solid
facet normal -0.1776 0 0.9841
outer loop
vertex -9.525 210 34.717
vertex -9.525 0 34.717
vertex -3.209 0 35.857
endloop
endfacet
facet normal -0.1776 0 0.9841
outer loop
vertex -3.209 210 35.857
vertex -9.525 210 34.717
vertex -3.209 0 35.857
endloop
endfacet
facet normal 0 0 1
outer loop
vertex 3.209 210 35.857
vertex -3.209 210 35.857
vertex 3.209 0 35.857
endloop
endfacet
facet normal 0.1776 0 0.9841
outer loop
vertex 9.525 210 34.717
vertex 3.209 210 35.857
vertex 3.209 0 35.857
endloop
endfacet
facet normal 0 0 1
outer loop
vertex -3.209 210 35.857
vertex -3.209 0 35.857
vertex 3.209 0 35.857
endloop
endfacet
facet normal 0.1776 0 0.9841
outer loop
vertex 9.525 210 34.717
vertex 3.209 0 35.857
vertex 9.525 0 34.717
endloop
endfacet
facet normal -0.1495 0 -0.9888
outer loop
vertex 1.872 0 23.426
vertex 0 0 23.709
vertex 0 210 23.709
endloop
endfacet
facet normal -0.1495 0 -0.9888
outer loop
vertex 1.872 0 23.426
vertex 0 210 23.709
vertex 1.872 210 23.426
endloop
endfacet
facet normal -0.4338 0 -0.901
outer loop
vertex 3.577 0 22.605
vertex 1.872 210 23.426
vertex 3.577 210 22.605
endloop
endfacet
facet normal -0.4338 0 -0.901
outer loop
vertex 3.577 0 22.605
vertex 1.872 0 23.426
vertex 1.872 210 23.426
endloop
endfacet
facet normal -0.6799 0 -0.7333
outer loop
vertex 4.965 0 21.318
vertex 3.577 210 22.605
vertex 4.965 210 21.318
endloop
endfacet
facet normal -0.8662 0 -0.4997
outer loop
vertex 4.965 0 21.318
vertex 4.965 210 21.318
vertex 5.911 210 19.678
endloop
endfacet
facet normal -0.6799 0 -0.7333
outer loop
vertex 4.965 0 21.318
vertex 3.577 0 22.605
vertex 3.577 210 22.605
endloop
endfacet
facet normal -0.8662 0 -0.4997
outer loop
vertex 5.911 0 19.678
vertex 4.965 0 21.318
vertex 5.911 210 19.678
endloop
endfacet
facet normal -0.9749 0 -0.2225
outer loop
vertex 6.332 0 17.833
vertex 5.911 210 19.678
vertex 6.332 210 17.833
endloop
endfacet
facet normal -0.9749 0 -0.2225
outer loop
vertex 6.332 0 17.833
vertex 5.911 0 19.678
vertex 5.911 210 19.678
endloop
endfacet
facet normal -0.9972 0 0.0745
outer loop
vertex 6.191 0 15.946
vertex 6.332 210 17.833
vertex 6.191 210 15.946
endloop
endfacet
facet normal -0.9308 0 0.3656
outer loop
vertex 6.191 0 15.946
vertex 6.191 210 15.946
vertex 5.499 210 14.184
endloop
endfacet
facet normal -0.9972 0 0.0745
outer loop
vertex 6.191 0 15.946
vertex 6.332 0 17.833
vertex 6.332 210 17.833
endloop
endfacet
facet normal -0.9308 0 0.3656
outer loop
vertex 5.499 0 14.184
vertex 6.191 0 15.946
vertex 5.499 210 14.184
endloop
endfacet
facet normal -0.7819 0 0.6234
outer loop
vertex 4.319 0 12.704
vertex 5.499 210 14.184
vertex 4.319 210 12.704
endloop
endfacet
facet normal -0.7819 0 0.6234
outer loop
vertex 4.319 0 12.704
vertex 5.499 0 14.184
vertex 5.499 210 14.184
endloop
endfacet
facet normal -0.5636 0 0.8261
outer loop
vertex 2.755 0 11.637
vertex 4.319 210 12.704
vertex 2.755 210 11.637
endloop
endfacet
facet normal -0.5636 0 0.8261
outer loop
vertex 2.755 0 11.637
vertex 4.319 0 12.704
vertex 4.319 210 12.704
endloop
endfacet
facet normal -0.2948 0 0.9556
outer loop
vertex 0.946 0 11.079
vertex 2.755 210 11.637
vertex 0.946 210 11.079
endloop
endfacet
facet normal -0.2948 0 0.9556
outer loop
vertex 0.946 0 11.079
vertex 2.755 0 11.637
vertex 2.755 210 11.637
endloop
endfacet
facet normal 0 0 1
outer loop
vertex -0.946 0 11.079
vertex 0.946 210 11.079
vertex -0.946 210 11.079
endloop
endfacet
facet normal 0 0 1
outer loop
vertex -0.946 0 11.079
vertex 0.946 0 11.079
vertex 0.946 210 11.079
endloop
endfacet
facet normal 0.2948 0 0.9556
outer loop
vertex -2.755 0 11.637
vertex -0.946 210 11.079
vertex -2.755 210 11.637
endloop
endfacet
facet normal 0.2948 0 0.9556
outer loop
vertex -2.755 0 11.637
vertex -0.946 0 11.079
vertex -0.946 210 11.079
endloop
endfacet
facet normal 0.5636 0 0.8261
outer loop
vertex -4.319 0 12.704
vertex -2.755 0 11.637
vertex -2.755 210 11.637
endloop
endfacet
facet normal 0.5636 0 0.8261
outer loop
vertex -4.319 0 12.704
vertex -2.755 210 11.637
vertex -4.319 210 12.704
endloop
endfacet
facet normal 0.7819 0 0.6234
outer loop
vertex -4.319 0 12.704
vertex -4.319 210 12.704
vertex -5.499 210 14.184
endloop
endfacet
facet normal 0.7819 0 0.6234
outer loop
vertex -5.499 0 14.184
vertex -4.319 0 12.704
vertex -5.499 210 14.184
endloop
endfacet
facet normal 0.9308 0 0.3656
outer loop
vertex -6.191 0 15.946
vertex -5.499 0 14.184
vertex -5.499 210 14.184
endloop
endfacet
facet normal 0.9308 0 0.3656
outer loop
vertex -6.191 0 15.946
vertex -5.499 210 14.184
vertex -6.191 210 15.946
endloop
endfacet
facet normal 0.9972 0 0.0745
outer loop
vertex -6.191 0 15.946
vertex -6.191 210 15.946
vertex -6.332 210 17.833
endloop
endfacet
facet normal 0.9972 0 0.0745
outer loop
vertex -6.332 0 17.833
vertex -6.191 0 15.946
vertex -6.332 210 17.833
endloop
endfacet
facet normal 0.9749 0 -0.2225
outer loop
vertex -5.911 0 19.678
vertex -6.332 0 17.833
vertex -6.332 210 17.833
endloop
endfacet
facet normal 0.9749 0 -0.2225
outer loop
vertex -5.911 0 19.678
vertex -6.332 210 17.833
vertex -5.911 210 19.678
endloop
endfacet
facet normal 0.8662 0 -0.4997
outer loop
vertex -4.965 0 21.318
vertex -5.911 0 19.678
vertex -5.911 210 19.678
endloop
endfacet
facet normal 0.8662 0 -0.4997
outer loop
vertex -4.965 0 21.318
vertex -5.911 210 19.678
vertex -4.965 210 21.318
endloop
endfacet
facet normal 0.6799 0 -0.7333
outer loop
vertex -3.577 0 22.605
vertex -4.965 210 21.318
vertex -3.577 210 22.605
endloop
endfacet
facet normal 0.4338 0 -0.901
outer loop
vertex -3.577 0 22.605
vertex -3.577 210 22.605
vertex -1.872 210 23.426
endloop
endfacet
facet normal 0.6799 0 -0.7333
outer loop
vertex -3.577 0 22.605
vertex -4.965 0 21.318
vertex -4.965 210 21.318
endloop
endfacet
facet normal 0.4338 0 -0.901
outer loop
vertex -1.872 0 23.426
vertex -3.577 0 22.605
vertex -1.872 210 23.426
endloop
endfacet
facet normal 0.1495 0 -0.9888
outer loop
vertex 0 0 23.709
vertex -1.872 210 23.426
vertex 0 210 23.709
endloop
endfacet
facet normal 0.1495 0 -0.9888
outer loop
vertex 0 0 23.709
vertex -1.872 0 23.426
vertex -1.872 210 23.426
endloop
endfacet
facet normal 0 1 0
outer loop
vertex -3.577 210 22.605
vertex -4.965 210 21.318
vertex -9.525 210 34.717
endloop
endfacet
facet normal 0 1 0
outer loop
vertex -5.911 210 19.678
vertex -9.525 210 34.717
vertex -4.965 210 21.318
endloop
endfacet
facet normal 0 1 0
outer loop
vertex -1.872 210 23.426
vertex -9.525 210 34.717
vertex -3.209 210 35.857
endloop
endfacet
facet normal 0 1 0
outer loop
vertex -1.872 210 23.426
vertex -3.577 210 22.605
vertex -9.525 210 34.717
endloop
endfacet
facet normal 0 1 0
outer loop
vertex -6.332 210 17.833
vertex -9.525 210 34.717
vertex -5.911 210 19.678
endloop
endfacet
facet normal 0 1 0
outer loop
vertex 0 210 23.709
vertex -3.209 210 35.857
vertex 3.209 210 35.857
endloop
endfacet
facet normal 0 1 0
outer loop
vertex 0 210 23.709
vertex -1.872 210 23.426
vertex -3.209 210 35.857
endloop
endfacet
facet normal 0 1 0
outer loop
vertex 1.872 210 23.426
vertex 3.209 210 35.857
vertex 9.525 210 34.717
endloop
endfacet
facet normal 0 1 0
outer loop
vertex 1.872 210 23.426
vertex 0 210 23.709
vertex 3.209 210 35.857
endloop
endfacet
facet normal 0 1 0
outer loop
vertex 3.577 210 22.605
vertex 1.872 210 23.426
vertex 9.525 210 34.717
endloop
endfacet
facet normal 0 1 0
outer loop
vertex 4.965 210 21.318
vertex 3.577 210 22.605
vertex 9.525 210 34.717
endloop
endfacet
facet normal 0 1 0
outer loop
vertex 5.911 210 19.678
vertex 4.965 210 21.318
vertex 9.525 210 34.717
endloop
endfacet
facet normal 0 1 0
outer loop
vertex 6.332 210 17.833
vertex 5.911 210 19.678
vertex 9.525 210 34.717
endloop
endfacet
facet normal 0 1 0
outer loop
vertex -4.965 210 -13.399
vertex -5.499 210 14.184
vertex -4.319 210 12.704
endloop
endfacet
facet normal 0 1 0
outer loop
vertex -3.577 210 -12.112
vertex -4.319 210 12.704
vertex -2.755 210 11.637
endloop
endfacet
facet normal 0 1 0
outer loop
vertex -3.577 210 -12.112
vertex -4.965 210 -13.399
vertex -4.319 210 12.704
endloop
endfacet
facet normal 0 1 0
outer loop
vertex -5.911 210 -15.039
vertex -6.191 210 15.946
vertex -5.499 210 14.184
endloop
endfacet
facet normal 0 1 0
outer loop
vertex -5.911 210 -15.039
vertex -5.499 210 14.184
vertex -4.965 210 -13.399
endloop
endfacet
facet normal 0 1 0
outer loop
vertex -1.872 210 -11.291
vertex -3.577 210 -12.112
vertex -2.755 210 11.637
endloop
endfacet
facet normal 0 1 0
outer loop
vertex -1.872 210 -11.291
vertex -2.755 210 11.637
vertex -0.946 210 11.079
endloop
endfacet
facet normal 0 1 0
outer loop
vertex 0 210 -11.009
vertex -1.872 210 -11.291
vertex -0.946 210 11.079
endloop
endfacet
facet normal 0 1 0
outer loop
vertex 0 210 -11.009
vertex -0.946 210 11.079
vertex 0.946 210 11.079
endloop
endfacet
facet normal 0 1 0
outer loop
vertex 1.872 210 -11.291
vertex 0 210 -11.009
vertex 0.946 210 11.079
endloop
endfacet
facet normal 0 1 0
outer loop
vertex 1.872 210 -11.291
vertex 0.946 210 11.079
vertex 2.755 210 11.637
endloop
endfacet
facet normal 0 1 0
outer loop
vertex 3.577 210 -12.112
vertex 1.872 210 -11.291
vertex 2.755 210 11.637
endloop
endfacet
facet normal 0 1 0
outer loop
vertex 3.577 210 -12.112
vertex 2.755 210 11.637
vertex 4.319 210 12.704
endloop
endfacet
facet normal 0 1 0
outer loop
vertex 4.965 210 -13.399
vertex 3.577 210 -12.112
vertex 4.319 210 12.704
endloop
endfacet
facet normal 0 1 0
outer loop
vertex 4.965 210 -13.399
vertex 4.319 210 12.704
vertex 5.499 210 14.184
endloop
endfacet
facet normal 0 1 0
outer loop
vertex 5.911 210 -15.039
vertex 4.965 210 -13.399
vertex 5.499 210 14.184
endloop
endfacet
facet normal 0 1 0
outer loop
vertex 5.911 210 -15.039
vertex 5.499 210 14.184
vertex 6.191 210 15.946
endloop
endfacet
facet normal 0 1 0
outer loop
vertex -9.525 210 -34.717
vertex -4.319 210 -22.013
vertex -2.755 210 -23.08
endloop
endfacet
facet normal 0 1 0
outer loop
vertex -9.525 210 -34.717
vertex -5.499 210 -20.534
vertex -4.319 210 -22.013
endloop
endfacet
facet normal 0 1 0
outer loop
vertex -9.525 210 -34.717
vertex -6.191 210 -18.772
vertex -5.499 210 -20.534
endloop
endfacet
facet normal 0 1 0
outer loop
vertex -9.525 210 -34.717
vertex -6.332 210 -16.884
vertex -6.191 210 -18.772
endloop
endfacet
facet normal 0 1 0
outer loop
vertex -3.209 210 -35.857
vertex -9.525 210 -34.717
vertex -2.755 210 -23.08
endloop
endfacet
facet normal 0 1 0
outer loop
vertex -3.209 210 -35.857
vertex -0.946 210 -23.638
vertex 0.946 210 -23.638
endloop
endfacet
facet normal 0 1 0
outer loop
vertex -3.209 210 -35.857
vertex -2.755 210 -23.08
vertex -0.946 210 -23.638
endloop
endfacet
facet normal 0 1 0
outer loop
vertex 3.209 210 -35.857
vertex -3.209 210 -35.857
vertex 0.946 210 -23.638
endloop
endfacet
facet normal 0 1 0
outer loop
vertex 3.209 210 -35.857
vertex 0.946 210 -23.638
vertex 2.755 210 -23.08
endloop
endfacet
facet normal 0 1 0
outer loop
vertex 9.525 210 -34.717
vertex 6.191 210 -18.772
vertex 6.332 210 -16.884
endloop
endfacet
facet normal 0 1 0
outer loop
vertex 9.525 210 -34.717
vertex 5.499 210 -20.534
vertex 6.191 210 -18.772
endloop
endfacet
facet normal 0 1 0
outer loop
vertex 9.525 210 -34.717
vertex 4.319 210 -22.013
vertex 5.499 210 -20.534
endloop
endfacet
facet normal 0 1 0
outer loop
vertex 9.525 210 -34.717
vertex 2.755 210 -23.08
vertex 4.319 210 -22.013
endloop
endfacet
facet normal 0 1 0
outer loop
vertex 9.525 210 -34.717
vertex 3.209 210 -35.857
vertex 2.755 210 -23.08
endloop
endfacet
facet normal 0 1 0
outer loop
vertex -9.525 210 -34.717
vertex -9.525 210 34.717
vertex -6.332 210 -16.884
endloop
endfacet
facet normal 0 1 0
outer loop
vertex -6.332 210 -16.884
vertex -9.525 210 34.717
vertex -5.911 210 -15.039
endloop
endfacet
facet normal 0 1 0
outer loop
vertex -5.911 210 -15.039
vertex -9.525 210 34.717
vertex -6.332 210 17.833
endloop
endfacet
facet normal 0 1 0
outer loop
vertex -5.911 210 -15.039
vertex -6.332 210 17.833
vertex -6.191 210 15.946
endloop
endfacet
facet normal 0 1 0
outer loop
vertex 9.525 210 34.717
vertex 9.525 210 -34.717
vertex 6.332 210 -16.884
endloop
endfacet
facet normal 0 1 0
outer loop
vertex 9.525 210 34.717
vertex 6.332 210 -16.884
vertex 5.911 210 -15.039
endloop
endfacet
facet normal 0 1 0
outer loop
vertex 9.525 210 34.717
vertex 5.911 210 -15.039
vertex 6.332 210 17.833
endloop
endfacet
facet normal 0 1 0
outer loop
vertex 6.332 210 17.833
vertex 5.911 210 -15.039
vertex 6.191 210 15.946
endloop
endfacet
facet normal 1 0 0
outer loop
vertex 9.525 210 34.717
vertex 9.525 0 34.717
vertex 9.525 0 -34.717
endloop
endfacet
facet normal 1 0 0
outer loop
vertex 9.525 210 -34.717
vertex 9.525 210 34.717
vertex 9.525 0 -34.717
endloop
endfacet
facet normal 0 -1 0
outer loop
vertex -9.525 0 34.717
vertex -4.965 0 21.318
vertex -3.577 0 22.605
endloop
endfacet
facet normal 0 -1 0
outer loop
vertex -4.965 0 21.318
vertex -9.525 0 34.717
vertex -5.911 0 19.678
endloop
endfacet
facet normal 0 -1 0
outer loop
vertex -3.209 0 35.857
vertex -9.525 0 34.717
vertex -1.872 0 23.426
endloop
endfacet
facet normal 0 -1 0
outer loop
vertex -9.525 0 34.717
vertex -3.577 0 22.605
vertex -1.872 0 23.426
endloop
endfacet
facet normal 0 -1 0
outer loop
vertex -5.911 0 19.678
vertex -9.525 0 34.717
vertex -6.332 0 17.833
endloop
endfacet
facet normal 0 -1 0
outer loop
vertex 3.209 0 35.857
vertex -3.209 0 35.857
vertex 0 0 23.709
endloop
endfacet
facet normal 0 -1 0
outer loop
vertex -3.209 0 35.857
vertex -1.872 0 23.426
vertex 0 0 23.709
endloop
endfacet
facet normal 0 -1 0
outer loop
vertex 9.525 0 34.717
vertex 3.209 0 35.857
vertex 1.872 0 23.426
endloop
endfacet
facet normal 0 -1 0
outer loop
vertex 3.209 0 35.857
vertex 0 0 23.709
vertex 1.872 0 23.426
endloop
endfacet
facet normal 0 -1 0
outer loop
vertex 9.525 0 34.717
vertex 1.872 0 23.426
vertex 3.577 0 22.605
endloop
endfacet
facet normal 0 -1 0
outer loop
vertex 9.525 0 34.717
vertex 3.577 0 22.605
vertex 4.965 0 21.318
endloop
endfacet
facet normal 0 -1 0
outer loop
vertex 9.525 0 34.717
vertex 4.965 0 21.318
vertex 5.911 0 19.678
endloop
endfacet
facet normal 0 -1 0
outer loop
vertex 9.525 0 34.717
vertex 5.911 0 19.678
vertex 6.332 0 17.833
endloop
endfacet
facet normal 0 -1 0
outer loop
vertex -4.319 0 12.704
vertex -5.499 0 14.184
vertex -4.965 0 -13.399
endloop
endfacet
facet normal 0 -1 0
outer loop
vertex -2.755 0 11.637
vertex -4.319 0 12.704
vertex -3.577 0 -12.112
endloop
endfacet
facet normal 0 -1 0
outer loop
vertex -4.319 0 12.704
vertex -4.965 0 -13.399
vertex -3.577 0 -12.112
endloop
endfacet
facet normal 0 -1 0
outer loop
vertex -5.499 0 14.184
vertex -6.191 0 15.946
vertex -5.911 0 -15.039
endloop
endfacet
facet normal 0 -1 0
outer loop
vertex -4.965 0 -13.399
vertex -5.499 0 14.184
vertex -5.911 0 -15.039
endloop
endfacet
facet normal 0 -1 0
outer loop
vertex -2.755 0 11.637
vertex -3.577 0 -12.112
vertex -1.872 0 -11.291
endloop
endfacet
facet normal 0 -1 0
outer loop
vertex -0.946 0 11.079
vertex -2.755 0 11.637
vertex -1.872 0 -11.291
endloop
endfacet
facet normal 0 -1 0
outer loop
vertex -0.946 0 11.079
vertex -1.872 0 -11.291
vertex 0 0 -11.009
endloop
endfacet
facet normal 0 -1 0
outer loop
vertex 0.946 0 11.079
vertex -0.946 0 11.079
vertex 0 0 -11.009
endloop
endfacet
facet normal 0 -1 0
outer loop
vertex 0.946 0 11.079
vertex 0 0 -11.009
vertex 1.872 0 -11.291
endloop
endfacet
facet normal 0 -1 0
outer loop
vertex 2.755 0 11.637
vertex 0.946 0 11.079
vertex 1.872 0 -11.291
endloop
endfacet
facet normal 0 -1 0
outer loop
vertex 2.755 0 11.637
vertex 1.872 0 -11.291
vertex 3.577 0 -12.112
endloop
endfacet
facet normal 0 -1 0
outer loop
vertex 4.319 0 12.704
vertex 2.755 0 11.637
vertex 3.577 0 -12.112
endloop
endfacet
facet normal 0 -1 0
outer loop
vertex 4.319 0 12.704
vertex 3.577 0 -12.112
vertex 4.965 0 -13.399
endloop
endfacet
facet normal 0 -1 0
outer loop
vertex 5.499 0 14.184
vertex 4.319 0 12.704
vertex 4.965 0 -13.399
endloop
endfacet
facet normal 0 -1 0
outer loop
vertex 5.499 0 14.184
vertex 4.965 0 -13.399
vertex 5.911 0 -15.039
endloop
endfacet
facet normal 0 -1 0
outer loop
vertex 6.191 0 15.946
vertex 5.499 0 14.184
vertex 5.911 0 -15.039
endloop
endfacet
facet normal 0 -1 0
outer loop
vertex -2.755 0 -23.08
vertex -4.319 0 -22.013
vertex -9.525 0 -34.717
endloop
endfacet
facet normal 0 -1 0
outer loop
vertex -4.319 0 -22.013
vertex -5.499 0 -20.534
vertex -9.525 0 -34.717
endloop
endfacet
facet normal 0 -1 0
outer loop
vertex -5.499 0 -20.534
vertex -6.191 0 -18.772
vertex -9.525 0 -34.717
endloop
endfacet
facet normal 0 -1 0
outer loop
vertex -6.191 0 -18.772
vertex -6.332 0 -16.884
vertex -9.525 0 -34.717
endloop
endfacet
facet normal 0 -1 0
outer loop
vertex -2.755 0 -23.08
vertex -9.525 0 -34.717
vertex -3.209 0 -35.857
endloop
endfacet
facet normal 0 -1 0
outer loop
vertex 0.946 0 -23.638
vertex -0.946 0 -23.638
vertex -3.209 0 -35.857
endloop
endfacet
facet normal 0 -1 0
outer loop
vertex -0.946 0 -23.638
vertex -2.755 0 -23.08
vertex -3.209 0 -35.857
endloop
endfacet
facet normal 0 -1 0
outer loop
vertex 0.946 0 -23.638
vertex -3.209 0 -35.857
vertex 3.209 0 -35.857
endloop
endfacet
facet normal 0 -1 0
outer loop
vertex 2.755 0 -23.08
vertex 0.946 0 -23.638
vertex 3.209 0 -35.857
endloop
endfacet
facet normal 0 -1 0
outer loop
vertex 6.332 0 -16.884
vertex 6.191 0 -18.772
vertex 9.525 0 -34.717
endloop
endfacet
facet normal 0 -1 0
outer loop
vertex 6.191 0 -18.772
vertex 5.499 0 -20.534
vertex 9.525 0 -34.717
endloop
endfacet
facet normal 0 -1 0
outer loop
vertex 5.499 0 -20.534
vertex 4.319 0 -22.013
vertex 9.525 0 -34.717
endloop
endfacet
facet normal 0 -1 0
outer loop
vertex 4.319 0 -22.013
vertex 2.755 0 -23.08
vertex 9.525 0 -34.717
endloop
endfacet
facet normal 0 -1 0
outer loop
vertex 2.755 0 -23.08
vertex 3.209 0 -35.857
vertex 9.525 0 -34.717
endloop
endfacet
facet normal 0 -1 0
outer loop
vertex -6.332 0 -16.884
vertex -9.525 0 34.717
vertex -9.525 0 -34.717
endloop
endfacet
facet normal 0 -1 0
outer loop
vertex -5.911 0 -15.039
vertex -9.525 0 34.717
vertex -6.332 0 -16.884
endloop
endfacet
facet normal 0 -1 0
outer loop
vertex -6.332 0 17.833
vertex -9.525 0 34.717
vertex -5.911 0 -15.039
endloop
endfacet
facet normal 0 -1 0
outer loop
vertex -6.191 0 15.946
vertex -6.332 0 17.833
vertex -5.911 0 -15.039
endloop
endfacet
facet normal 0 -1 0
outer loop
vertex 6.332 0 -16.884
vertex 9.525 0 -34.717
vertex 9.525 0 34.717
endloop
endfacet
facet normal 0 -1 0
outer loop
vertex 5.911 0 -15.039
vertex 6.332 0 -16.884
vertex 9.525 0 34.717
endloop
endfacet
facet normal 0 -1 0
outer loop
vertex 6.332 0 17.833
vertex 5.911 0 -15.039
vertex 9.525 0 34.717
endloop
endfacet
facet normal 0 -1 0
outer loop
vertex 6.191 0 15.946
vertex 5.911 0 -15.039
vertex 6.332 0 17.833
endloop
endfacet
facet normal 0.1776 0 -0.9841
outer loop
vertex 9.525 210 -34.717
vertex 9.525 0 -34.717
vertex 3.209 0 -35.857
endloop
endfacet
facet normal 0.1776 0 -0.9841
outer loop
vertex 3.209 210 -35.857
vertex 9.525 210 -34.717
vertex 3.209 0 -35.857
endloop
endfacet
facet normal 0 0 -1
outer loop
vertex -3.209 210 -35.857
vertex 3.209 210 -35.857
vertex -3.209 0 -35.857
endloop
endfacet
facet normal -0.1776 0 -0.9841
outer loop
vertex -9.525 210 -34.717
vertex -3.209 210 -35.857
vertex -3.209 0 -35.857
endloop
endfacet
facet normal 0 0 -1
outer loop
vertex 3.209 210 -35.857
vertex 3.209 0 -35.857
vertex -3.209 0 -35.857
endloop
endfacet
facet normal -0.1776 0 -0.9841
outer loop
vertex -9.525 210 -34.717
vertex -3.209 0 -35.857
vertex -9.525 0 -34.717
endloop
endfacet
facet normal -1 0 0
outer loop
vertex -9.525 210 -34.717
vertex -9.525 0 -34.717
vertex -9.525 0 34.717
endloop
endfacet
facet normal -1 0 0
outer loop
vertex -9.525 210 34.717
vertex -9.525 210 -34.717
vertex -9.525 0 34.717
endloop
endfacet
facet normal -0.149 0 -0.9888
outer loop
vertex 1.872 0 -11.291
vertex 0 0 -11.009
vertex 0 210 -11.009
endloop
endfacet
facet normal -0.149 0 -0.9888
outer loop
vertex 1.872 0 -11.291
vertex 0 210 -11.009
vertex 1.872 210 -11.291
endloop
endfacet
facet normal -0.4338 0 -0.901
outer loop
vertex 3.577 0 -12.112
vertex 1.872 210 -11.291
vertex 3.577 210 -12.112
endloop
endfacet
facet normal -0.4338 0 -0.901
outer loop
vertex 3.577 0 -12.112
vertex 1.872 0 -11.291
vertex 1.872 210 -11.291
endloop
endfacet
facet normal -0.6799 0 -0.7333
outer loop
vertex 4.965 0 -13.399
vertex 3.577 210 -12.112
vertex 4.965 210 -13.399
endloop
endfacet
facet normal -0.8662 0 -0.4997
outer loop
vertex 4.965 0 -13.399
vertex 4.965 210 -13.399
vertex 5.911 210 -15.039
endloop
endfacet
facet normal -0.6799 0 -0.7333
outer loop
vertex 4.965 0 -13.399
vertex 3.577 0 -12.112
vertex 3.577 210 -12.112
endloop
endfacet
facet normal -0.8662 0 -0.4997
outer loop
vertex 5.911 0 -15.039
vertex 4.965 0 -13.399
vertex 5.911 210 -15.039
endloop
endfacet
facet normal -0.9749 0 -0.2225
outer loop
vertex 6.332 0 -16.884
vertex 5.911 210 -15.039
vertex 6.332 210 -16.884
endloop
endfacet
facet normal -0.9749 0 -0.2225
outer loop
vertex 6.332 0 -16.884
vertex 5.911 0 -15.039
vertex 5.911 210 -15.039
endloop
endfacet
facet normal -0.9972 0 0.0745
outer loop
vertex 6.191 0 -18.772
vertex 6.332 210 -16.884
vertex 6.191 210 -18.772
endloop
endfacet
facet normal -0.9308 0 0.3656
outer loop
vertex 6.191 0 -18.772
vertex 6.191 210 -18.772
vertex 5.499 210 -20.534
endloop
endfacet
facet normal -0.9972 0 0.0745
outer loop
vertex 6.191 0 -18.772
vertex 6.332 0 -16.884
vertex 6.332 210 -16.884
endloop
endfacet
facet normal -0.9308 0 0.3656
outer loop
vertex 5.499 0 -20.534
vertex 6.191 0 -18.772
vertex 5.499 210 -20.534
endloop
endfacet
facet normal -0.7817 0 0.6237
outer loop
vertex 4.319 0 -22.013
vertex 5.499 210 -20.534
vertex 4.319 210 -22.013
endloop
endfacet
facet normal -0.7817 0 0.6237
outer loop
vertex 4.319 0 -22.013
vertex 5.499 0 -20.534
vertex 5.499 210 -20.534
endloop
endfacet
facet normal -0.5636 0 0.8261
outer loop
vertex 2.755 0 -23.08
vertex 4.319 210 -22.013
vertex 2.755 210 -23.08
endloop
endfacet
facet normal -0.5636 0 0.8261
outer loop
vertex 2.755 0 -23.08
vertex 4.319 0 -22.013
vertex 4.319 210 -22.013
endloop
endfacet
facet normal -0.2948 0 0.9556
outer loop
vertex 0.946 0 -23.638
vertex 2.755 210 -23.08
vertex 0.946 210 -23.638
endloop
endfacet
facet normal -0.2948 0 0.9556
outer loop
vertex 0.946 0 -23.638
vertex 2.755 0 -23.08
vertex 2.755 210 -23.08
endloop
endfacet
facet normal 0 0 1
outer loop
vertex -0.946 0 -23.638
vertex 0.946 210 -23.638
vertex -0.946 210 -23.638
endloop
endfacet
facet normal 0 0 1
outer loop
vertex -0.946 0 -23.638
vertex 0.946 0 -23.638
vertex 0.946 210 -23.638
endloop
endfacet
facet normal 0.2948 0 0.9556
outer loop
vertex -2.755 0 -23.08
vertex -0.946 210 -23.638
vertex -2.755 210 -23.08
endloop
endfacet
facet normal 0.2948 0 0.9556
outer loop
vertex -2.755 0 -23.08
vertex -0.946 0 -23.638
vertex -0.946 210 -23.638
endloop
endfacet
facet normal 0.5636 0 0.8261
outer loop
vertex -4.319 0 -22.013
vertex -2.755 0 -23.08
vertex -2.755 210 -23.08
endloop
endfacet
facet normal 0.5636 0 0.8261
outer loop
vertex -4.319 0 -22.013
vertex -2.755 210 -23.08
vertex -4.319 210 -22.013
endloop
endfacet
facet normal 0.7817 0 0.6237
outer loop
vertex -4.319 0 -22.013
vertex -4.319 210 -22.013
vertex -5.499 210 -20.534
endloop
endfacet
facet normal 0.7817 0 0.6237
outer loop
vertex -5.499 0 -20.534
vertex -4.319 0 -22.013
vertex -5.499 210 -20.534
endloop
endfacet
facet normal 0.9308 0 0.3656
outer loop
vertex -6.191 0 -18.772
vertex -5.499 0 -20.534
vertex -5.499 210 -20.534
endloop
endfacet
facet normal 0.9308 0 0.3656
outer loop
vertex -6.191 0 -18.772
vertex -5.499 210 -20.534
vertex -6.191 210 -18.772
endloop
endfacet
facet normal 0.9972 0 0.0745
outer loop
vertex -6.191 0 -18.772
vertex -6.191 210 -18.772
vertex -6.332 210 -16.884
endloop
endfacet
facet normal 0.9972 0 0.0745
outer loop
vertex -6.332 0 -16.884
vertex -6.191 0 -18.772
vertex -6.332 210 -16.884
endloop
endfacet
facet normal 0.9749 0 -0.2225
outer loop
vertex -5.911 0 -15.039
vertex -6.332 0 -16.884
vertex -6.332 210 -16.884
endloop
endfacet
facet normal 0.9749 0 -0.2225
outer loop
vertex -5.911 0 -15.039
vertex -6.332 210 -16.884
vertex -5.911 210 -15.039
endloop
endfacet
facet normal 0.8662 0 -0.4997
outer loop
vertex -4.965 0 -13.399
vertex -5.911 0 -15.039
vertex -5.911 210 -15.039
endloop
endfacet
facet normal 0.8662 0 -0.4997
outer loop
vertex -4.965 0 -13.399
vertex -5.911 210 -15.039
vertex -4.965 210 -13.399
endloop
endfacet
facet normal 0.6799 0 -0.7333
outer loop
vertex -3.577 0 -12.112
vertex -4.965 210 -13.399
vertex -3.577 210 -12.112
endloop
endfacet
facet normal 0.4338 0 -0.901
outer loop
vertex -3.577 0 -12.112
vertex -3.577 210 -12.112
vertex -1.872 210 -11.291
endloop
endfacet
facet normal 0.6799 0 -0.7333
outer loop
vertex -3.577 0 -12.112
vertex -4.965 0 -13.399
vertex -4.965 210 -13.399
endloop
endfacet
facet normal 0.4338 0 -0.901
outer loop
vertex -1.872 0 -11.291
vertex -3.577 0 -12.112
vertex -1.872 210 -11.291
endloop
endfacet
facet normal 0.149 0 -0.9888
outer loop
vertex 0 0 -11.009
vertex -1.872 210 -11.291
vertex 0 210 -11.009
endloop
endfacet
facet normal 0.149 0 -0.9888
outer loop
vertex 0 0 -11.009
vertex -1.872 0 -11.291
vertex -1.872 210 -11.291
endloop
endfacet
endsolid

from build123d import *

# Parameters (mm, degrees)
SKETCH2_R           = 6.35
BOSS_EXTRUDE1_DEPTH = 210


with BuildPart() as part:
    # Sketch2 → Boss-Extrude1 (new body)
    # profile 1 of 2: a face of its own
    with BuildSketch(Plane(origin=(0, 0, 0), x_dir=(1, 0, 0), z_dir=(0, 1, 0))):
        with BuildLine():
            Line((9.525, -34.717061728), (9.525, 0))
            Line((9.525, 0), (-9.525, 0))
            Line((-9.525, 0), (-9.525, -34.717061728))
            ThreePointArc((-9.525, -34.717061728), (0, -36), (9.525, -34.717061728))
        make_face()
        with Locations(Location((0, -17.358530864, 0), (0, 0, 270))):
            Circle(SKETCH2_R, mode=Mode.SUBTRACT)
    # profile 2 of 2: a face of its own
    with BuildSketch(Plane(origin=(0, 0, 0), x_dir=(1, 0, 0), z_dir=(0, 1, 0))):
        with BuildLine():
            Line((-9.525, 0), (9.525, 0))
            Line((9.525, 0), (9.525, 34.717061728))
            ThreePointArc((9.525, 34.717061728), (0, 36), (-9.525, 34.717061728))
            Line((-9.525, 34.717061728), (-9.525, 0))
        make_face()
        with Locations(Location((0, 17.358530864, 0), (0, 0, 270))):
            Circle(SKETCH2_R, mode=Mode.SUBTRACT)
    extrude(amount=BOSS_EXTRUDE1_DEPTH)


solid = part.part
